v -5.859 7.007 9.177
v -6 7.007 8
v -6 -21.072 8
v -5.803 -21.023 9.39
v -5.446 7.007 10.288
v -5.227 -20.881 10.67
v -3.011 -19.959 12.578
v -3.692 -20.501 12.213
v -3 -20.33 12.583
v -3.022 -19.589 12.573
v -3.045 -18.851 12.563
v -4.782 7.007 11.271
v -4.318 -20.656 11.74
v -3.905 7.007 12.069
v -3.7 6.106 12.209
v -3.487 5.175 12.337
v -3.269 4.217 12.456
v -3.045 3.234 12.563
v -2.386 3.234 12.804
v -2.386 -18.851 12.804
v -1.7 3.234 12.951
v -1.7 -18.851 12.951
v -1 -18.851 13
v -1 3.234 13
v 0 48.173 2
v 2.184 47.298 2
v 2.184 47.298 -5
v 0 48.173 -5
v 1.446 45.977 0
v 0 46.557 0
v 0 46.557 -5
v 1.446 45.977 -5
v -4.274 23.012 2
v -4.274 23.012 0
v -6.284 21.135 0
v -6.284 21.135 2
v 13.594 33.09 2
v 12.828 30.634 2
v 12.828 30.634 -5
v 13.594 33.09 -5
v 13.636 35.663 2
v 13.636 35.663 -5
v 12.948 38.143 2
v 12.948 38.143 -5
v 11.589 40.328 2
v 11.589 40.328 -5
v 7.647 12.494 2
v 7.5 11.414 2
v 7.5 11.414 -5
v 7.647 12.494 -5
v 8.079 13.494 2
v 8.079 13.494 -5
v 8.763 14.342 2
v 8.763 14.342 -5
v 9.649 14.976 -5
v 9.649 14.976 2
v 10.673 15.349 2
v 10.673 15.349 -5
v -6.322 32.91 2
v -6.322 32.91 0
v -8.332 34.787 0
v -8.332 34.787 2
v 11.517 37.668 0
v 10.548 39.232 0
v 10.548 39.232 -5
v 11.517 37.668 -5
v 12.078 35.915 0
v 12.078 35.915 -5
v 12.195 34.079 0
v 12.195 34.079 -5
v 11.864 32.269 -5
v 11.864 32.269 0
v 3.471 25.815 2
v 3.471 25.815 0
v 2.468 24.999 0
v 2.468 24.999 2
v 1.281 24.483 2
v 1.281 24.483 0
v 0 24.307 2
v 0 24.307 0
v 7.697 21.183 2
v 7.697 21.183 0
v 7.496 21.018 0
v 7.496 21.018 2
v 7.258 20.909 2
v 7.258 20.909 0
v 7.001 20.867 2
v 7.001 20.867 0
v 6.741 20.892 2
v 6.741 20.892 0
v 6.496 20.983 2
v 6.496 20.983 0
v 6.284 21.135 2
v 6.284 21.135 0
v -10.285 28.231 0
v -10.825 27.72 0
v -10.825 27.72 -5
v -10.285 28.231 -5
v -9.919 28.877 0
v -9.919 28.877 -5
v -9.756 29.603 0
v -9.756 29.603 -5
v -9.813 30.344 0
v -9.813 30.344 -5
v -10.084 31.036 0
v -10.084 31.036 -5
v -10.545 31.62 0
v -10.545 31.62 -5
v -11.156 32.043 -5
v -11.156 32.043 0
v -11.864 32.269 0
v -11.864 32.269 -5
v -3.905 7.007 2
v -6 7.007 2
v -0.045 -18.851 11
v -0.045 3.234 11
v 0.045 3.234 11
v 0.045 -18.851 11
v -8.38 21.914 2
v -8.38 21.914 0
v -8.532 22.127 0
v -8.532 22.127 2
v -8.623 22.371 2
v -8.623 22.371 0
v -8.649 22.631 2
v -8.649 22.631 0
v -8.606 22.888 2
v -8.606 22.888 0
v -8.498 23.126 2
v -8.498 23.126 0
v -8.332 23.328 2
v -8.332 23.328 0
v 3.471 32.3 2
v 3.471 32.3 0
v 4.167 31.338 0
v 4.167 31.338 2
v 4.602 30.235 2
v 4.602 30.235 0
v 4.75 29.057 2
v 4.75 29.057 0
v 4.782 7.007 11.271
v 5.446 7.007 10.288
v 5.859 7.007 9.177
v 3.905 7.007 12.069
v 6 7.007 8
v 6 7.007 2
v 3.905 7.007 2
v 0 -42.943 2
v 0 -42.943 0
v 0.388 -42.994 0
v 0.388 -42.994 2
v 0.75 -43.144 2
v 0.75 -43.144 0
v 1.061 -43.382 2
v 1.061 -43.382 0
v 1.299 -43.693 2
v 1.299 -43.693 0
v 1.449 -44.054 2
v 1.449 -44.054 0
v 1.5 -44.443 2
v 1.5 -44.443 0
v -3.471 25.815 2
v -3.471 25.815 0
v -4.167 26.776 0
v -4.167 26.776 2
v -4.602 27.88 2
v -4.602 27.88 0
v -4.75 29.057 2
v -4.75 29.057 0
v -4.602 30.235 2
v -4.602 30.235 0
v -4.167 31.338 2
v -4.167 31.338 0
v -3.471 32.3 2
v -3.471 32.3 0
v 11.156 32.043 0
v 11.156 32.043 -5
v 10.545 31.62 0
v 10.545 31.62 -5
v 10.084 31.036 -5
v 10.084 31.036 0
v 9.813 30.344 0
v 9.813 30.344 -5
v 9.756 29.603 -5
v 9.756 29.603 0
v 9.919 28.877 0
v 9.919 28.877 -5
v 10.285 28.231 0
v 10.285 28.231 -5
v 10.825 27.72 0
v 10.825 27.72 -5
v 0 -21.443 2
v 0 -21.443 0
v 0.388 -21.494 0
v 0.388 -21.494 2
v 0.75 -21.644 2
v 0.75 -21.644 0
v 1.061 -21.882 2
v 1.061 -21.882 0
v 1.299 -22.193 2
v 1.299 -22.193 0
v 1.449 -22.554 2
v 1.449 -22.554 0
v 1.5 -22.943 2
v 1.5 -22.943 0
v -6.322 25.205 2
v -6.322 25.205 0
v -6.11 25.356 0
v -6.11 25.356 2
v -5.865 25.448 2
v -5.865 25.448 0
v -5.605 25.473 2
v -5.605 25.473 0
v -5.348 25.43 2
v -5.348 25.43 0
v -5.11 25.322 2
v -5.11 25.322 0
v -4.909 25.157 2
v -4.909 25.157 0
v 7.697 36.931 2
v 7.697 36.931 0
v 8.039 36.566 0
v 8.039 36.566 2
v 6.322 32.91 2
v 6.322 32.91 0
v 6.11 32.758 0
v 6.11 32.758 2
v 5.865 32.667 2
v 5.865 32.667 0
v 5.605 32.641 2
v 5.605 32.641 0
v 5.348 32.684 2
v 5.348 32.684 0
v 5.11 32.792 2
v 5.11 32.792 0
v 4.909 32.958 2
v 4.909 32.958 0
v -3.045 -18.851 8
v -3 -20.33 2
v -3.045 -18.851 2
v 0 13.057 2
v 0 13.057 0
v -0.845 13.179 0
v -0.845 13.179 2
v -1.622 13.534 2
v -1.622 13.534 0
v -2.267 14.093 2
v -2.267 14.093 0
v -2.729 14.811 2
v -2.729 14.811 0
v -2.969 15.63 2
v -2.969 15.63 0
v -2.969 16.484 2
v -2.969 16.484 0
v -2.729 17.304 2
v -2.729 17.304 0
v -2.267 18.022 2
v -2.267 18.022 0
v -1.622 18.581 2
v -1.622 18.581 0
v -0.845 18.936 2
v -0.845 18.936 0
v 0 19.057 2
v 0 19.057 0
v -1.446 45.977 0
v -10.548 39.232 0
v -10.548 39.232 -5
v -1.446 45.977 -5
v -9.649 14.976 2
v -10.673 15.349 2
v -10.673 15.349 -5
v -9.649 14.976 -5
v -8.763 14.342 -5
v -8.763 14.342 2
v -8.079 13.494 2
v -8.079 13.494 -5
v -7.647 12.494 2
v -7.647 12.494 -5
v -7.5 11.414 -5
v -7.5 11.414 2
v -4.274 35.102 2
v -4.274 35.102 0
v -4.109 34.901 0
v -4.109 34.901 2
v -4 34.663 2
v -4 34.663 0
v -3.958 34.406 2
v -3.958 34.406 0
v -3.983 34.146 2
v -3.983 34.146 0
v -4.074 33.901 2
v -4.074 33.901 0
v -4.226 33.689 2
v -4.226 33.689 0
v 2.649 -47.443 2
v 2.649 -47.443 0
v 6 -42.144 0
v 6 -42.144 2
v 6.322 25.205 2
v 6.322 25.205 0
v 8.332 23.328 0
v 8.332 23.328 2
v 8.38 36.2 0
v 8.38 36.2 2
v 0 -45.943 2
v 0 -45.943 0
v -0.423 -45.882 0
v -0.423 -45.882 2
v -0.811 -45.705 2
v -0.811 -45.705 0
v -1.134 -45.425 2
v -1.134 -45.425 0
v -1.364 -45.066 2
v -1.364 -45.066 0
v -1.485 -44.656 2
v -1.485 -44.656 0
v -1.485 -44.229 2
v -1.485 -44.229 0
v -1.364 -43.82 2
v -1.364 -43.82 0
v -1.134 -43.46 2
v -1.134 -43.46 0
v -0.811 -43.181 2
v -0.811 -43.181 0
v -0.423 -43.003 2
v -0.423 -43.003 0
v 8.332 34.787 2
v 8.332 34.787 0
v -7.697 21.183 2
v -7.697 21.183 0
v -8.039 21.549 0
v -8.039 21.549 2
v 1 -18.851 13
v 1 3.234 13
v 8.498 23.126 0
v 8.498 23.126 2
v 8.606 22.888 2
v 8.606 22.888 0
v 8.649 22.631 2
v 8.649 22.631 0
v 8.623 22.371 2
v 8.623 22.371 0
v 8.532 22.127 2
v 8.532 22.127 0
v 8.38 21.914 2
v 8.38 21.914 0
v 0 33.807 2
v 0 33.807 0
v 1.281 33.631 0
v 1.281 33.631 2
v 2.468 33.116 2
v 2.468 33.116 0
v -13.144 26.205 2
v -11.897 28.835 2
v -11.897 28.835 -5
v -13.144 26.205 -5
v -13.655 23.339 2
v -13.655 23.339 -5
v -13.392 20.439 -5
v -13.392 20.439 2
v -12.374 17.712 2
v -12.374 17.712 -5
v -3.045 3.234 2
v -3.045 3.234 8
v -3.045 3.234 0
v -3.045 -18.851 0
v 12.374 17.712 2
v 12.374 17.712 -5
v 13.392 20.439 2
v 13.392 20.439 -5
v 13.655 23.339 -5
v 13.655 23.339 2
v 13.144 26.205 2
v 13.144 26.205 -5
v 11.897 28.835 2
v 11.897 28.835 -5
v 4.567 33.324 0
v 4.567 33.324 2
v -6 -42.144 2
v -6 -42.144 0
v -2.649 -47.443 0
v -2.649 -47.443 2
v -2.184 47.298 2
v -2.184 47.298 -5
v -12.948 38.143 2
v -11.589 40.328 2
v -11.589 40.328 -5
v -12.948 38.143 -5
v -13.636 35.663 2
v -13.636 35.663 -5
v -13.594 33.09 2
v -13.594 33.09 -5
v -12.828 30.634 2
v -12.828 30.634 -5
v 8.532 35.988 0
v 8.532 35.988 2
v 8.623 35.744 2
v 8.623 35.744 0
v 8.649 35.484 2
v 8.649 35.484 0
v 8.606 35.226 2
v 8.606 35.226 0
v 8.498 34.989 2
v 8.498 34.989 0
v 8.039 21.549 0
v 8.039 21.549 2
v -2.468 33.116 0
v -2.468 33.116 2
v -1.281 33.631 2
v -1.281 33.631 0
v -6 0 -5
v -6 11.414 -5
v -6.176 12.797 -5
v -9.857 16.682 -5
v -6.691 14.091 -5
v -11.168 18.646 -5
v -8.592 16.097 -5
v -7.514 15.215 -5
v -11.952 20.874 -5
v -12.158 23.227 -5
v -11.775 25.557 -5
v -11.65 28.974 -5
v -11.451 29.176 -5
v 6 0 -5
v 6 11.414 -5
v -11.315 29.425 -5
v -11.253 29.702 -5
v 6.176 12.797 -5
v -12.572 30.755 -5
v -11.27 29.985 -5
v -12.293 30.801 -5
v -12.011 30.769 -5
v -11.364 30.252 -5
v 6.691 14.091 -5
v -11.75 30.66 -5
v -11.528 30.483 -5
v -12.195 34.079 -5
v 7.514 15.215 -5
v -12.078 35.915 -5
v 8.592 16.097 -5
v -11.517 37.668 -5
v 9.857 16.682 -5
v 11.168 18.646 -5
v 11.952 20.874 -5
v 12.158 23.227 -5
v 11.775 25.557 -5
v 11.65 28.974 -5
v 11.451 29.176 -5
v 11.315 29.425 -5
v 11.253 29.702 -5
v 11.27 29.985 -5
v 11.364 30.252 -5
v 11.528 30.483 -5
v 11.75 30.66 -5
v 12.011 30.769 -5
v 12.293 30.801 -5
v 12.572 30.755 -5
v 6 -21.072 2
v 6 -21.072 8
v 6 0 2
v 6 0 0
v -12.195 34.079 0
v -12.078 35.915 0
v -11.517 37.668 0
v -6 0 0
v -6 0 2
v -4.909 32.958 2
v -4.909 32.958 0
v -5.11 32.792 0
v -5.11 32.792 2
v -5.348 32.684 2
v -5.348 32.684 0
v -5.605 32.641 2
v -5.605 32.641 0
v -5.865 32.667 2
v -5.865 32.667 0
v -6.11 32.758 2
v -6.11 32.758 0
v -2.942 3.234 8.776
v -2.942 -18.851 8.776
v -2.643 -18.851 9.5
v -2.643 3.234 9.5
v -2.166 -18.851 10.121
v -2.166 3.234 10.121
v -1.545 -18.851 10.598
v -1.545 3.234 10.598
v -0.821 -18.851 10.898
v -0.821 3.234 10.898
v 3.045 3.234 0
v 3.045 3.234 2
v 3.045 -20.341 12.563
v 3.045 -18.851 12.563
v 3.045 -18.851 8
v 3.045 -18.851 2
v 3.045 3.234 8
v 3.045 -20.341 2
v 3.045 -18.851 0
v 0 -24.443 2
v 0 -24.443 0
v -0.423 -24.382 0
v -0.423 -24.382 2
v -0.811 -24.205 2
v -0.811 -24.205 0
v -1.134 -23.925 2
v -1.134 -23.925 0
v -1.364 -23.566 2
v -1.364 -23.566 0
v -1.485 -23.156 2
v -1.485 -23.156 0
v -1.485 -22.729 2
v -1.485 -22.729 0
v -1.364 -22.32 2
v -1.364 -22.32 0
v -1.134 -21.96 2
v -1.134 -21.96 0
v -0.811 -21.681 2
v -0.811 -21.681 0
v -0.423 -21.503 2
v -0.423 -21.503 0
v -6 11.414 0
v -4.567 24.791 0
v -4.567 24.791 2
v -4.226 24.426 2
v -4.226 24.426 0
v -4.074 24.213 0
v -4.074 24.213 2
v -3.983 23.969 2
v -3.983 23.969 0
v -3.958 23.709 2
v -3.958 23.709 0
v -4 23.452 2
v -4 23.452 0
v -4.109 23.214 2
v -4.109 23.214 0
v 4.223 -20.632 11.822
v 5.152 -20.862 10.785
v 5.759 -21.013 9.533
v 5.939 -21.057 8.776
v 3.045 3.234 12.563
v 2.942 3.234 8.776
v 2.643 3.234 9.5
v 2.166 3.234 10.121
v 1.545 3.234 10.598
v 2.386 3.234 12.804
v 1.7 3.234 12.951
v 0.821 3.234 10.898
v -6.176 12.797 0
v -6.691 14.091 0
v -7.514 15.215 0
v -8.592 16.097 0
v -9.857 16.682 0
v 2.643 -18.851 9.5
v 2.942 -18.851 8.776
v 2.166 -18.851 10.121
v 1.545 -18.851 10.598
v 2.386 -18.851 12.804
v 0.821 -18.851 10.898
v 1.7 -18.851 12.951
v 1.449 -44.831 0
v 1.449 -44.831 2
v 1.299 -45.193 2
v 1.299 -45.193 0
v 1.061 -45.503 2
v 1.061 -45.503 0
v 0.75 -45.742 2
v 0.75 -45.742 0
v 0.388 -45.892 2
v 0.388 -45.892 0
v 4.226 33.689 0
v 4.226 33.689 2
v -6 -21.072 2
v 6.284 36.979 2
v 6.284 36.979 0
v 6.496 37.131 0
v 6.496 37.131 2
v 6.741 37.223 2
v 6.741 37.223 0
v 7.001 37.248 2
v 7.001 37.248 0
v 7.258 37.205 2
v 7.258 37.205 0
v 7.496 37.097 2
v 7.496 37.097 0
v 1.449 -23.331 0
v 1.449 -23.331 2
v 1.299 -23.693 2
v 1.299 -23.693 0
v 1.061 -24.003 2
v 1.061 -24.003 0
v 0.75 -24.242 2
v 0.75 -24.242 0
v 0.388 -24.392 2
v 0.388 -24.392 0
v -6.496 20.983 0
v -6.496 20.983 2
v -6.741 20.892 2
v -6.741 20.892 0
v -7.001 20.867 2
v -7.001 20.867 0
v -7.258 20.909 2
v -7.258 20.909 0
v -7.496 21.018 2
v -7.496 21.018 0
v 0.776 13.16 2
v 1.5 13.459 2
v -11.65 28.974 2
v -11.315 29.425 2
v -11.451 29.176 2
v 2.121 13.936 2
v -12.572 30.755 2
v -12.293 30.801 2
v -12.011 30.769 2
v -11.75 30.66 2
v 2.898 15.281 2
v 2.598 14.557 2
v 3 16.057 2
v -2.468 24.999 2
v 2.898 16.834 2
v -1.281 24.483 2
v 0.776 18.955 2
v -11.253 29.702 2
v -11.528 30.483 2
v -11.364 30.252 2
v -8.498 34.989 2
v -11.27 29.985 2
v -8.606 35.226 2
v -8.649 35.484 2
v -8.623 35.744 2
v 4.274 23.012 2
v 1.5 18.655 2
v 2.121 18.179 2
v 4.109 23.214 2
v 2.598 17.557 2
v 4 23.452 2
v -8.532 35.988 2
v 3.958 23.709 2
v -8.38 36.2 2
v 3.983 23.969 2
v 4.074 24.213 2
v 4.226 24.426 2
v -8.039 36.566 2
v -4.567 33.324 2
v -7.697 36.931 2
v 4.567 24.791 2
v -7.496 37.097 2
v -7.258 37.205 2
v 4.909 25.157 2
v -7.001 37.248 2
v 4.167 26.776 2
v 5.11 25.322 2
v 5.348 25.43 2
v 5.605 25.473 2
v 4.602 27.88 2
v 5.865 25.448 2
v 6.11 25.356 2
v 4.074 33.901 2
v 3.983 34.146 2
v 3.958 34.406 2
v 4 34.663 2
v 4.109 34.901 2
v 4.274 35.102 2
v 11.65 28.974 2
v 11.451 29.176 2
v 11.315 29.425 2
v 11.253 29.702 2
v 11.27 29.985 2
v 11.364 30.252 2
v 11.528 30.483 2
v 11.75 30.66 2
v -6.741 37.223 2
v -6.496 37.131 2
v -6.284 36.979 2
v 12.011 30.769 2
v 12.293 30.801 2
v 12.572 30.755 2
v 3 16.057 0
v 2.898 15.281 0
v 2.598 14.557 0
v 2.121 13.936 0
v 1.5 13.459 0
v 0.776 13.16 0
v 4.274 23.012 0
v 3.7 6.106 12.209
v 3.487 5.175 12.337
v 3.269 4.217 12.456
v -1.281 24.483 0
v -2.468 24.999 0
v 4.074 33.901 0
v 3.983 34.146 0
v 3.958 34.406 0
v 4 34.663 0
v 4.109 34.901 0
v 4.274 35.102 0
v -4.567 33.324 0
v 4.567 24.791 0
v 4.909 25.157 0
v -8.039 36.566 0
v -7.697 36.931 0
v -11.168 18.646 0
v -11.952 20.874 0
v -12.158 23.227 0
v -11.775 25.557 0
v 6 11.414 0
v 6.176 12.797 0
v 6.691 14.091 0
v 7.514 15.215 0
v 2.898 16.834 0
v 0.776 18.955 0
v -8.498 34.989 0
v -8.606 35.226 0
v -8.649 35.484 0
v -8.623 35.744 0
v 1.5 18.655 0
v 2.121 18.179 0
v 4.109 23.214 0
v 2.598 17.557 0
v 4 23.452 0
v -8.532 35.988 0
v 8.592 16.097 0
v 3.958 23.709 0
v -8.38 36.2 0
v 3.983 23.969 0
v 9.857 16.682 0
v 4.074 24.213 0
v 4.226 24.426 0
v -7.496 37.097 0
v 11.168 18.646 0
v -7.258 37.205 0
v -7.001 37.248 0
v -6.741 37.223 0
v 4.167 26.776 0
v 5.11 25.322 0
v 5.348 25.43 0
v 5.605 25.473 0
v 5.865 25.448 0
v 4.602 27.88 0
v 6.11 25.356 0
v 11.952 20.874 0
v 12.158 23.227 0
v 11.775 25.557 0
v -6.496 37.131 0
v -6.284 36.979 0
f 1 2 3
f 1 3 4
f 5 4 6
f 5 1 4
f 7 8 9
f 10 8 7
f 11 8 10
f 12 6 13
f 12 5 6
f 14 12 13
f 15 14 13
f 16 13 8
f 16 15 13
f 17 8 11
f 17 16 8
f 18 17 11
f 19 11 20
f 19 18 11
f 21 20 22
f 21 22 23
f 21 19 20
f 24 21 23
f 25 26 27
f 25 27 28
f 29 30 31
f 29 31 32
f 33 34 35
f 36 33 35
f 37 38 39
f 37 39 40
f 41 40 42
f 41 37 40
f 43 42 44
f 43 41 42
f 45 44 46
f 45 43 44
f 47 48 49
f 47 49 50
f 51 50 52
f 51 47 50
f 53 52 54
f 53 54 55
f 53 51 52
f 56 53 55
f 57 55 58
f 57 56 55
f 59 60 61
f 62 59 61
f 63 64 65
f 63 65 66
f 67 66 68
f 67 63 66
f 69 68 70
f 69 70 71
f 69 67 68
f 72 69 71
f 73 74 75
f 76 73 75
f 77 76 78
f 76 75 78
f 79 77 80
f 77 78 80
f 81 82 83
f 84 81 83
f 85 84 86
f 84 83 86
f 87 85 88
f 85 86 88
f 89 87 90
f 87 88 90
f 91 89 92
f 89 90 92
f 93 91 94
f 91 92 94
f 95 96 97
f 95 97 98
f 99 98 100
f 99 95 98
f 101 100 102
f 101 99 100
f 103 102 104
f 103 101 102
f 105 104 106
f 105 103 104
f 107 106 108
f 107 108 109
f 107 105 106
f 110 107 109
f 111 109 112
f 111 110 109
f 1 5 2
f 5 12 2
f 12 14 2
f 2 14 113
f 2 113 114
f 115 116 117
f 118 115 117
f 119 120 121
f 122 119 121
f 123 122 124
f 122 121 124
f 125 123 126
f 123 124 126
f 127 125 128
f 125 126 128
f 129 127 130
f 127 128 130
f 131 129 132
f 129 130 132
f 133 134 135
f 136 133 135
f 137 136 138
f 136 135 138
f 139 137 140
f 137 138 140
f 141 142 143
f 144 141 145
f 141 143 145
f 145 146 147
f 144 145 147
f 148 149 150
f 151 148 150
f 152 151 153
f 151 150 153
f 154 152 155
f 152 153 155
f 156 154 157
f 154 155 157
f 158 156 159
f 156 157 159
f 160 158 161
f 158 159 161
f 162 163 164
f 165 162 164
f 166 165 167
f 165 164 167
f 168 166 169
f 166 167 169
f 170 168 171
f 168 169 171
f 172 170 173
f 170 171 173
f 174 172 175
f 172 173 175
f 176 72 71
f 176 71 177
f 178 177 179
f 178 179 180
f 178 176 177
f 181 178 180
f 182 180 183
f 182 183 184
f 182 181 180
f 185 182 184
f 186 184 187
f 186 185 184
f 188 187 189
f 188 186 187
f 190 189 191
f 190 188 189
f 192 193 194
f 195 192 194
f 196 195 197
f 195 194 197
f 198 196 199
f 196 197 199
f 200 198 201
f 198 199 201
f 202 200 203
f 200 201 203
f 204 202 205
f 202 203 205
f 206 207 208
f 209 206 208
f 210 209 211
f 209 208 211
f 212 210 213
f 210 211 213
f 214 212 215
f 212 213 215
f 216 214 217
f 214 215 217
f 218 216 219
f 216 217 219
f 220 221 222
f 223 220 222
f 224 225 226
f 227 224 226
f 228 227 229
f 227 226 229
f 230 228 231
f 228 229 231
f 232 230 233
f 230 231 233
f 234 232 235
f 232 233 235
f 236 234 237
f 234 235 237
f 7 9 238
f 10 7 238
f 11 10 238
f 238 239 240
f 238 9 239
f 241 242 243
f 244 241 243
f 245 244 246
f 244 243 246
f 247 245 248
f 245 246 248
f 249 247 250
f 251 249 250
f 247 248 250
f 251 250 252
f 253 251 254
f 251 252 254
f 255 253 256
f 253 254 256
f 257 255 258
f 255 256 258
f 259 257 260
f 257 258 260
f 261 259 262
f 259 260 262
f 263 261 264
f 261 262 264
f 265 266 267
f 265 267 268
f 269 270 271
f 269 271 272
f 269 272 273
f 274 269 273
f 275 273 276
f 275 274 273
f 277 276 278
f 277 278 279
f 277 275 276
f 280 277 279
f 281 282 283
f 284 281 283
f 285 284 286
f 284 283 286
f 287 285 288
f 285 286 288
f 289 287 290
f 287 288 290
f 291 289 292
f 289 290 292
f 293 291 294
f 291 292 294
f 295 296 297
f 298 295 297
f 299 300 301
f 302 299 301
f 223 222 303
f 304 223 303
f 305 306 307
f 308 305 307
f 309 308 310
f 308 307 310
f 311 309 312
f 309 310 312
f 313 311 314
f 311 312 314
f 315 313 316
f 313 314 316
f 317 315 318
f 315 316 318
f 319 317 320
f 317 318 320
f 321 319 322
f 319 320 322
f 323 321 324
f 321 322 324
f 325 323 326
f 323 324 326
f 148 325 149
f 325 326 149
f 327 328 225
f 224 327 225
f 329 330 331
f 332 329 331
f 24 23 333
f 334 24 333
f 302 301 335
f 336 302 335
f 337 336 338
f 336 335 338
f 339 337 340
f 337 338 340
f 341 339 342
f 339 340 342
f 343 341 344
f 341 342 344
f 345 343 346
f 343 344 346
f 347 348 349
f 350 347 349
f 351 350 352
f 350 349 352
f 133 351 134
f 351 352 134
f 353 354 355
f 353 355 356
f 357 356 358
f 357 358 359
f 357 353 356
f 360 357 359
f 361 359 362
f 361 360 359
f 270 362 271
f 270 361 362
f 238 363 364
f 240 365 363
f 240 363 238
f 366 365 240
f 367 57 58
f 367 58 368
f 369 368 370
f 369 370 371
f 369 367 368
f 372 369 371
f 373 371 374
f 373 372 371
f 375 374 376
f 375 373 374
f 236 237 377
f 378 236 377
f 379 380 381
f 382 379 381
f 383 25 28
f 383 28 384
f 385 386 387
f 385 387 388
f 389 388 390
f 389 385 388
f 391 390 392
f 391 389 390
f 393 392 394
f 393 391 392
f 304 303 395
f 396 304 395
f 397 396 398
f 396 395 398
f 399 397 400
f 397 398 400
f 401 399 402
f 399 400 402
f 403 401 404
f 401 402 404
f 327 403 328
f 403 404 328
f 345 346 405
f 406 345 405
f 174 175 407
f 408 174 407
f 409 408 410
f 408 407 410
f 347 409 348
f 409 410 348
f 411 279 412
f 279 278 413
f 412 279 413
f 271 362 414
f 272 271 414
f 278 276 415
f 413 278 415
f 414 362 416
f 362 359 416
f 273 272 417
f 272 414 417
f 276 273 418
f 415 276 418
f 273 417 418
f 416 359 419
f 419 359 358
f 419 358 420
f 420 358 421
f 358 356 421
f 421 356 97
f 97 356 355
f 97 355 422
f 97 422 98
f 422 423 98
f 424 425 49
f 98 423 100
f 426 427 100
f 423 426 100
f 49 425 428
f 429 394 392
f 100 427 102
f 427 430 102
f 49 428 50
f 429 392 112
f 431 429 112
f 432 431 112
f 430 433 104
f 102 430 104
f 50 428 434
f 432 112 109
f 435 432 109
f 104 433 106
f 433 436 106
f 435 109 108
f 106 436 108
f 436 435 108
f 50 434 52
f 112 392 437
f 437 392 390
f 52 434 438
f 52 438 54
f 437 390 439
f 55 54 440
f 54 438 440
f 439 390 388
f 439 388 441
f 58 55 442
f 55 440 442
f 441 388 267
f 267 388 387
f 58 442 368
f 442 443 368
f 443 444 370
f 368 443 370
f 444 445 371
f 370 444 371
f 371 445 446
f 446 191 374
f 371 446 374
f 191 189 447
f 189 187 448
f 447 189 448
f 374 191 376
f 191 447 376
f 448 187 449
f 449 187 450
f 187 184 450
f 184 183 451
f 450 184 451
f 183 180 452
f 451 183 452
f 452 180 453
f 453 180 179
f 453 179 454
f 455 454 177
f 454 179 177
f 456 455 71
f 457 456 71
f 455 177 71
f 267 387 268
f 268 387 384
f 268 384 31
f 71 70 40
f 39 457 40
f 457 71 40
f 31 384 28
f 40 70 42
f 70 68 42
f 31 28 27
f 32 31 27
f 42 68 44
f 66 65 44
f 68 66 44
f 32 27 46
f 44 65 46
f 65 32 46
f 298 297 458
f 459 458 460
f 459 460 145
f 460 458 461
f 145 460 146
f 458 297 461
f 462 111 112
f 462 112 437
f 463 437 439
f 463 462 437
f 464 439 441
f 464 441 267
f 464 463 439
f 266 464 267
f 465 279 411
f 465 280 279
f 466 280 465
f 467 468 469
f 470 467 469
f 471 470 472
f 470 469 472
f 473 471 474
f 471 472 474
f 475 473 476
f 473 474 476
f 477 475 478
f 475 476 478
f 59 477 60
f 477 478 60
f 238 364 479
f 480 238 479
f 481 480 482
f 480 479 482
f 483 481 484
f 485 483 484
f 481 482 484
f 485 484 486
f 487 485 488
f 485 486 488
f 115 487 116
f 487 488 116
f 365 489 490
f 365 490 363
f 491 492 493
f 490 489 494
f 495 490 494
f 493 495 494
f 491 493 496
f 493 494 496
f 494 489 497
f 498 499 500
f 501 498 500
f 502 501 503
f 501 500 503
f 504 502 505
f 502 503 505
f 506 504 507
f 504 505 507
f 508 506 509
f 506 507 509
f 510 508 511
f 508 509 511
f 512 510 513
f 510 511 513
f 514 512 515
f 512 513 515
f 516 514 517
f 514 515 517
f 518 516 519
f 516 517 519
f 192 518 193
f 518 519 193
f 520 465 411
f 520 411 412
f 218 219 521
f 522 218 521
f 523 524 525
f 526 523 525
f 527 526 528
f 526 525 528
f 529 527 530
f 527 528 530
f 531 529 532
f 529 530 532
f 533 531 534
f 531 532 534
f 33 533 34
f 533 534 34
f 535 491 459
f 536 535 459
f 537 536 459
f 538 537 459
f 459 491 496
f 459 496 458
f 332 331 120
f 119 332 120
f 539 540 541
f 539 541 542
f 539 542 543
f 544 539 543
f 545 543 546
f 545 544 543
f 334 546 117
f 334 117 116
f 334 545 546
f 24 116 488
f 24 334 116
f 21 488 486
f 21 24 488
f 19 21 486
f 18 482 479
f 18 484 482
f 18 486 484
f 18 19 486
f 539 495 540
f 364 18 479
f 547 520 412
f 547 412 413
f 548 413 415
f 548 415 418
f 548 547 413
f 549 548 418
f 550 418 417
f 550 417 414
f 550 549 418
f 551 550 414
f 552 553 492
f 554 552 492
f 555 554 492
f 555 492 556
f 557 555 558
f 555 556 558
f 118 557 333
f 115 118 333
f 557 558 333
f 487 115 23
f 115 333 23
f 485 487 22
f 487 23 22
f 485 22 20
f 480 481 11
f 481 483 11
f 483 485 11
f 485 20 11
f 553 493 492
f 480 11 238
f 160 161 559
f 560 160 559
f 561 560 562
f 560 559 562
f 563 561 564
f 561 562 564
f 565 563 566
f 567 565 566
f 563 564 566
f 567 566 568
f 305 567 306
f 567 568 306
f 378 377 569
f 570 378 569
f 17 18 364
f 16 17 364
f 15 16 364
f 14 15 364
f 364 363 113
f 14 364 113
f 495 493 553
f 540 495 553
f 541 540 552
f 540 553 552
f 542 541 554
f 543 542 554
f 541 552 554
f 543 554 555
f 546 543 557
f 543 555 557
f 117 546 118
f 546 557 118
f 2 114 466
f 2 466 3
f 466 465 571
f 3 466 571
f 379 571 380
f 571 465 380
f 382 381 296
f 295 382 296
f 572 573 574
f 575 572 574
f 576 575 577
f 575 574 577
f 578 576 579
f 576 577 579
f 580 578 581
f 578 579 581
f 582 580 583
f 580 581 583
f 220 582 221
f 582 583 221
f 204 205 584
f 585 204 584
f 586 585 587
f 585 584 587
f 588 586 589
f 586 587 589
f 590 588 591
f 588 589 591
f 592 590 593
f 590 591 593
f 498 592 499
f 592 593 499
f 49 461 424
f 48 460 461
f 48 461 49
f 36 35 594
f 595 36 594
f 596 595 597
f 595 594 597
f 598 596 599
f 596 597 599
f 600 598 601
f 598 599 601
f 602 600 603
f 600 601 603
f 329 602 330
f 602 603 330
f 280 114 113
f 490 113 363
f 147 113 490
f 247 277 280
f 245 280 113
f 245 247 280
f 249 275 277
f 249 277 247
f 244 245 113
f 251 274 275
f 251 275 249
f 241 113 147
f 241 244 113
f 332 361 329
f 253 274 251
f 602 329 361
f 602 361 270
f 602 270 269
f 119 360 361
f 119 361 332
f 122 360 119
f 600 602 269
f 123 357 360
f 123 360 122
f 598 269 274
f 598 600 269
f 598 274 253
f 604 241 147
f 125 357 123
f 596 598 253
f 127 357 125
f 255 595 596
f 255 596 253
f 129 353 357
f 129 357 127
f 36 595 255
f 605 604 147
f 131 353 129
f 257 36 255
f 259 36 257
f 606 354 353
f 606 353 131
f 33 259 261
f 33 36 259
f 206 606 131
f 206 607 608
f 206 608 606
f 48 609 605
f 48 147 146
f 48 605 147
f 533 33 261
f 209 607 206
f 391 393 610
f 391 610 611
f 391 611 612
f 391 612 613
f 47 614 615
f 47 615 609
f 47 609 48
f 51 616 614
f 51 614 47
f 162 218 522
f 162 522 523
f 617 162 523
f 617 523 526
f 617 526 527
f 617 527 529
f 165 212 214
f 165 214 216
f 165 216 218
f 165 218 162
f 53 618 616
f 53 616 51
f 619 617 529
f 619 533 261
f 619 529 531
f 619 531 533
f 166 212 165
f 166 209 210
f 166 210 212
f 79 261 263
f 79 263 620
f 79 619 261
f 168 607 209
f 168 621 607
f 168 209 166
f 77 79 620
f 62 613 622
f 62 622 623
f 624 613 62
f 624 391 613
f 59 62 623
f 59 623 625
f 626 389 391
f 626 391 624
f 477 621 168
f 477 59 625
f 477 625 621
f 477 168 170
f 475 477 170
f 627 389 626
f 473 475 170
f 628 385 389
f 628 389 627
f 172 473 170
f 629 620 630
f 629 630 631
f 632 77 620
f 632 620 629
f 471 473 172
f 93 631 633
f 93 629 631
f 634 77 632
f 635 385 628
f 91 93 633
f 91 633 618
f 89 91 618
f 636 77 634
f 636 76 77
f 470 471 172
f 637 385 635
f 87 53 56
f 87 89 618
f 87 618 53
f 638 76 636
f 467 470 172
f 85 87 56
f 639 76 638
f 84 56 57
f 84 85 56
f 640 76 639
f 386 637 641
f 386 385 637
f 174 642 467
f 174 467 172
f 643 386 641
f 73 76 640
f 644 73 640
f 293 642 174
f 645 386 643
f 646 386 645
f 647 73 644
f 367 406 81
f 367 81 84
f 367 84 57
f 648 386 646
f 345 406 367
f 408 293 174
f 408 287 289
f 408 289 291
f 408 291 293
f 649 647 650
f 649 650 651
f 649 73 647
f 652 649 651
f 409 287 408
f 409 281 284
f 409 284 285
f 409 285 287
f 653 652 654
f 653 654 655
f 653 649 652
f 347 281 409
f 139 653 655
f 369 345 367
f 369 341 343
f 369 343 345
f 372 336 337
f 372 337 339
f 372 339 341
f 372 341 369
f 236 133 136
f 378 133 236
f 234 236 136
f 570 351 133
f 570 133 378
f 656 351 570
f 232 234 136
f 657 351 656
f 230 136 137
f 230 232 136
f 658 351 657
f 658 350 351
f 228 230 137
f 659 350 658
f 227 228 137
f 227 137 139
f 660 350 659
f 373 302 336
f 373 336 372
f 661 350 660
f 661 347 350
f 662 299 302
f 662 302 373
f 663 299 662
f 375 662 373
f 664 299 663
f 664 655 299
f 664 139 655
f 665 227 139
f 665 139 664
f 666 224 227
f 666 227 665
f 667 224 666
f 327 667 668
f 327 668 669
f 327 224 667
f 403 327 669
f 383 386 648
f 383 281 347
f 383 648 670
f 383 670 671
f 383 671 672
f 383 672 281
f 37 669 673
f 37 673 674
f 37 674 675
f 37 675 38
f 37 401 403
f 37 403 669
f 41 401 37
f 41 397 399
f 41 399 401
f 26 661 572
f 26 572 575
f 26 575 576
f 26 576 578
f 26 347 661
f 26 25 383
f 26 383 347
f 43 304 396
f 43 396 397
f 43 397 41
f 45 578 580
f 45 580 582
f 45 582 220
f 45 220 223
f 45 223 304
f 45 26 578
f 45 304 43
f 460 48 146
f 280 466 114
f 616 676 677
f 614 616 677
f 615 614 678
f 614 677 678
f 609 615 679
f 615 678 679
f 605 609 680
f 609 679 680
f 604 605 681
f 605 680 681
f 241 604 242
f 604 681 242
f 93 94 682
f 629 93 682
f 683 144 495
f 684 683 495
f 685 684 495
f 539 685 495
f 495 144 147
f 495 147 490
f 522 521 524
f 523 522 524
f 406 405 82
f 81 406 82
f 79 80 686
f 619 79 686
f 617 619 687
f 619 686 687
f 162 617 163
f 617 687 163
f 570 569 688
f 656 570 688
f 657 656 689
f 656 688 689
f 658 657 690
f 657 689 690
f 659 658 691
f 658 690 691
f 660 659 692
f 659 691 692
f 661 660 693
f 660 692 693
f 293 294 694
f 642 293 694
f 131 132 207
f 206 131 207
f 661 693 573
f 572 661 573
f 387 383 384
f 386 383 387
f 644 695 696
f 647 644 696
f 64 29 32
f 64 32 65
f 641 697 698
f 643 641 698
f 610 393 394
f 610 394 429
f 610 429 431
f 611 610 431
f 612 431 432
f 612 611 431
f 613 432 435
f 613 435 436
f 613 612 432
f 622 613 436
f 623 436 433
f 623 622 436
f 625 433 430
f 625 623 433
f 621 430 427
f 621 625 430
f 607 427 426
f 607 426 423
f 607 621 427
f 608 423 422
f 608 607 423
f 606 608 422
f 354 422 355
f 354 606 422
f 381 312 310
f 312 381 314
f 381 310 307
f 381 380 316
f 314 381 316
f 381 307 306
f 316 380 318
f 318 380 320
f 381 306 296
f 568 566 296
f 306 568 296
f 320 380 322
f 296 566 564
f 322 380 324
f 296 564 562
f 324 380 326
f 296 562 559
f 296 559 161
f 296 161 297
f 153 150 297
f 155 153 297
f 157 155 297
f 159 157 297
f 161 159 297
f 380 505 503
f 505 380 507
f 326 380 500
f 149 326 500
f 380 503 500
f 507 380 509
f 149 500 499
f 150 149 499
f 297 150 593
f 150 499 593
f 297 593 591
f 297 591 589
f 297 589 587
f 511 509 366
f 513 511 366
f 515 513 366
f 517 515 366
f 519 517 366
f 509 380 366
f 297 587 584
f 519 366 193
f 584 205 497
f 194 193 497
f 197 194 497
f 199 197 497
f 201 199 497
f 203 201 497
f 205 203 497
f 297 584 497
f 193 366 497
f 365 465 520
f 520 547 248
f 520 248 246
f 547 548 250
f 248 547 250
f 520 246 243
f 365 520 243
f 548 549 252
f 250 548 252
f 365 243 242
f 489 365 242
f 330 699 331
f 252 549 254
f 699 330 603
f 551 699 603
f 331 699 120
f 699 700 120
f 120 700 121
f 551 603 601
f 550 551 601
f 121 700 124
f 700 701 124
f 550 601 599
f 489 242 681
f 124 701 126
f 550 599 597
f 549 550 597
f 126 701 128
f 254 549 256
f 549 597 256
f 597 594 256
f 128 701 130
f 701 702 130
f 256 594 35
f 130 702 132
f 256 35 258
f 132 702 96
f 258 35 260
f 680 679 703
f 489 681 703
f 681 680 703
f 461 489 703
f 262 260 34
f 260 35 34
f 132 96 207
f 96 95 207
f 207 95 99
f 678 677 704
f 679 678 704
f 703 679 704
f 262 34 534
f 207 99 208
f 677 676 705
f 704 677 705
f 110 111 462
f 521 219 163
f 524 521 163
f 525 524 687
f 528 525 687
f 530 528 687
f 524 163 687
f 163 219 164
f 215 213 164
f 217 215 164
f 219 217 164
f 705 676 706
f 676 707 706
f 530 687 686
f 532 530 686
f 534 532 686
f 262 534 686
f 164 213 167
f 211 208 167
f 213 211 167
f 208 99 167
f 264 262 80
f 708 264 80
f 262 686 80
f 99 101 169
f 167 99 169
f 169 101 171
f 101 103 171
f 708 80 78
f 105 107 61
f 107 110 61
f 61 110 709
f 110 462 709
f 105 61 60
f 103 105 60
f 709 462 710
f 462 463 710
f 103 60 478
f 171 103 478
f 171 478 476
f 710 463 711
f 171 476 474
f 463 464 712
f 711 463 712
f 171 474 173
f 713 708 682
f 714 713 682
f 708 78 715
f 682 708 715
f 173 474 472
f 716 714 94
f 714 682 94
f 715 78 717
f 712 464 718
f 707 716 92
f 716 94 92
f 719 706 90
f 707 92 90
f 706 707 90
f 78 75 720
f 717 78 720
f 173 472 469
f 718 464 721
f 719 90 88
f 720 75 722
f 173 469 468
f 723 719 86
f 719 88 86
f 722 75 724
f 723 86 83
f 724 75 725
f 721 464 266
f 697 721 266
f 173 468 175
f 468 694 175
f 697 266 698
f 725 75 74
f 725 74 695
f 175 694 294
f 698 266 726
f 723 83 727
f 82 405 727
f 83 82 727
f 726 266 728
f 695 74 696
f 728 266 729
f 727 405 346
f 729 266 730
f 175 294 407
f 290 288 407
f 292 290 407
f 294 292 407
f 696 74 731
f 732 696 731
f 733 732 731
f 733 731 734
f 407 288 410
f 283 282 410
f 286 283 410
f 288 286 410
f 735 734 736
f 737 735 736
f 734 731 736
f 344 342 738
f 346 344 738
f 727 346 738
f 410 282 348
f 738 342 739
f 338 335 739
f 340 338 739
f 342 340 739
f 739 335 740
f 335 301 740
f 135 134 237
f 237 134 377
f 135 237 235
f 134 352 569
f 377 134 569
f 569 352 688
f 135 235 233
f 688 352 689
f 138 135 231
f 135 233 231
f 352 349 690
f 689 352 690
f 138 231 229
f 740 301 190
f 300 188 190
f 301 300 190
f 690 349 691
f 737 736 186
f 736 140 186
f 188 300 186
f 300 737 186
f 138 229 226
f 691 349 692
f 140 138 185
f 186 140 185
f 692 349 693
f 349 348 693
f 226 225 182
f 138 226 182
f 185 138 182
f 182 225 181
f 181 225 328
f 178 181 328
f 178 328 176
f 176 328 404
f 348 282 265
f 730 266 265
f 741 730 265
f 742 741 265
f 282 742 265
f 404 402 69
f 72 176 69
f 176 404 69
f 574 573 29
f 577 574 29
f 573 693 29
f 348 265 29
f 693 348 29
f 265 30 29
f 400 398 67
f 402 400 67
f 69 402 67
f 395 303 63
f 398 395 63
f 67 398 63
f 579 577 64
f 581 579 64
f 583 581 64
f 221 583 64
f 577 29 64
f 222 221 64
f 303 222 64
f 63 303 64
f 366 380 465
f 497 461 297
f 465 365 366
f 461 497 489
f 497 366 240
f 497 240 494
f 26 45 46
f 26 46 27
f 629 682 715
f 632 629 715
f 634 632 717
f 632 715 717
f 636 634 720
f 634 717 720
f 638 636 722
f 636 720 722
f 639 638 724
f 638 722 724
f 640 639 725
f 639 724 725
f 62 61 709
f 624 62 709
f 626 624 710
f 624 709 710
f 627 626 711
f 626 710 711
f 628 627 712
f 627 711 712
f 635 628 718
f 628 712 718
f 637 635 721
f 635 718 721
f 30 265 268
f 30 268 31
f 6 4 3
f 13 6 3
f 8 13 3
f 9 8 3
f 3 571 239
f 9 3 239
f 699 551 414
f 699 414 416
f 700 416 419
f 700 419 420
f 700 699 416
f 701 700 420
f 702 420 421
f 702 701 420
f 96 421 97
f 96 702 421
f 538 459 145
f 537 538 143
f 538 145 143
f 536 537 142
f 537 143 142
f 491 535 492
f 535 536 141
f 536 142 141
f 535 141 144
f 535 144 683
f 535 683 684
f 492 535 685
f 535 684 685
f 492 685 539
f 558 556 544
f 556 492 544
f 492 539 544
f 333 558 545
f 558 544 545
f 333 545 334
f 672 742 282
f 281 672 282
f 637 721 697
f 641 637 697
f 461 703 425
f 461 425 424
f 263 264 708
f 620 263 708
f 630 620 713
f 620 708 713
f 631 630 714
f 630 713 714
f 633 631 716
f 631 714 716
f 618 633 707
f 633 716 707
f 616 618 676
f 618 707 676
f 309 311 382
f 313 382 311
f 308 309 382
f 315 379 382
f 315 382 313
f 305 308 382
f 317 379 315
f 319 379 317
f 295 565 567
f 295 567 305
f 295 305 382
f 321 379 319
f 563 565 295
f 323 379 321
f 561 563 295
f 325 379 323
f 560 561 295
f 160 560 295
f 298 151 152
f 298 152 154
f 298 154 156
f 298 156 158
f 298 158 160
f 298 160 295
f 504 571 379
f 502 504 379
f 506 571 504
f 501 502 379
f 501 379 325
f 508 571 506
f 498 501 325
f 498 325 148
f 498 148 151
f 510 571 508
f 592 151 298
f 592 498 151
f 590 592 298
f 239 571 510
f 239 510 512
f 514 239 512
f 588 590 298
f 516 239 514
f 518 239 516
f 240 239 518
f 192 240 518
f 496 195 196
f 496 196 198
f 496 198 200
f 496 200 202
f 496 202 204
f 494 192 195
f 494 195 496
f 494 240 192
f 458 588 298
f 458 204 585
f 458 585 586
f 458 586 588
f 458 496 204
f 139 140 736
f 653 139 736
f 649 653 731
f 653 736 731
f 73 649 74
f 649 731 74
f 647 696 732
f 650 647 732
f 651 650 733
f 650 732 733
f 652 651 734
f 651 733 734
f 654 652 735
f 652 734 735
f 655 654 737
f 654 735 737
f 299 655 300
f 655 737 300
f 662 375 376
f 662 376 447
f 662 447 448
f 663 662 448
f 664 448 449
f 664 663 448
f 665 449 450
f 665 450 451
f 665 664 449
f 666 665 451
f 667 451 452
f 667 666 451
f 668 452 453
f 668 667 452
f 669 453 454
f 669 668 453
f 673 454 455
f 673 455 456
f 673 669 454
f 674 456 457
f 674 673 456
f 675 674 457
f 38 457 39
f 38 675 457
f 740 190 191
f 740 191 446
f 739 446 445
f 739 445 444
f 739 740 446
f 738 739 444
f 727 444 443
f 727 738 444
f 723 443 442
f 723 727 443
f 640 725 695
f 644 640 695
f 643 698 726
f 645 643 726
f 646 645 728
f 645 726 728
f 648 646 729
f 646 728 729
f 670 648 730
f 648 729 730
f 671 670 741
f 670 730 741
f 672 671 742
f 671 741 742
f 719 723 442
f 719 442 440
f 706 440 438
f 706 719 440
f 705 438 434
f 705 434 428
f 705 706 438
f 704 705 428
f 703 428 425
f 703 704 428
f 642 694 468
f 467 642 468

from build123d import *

# Parameters (mm, degrees)
F1_DEPTH     = 2
F0_W         = 3.0445663724
F0_H         = 3.2343552448
F0_H_2       = 18.850909546
F2_DEPTH     = 13
F3_DEPTH     = 11
F4_T4_DEPTH  = 22.0852647908
F4_T9_DEPTH  = 22.0852647908
F4_T15_DEPTH = 22.0852647908
F4_T20_DEPTH = 22.0852647908
F5_DEPTH     = 5
F6_T1_DEPTH  = 53.0795018189


# Not quite as in the source:
# - a fillet or chamfer that OpenCascade refuses, or shapes differently, is made with other operations: its cross-section is extruded or revolved along the edge and cut away or added


with BuildPart() as f1:
    # F0 (on Top) → F1 (new body)
    with BuildSketch(Plane.XY):
        with BuildLine():
            Line((0, -21.442663461), (0, -19.587084651))
            Line((0, -19.587084651), (-3, -20.329666324))
            Line((-3, -20.329666324), (-6, -21.0722479969))
            Line((-6, -21.0722479969), (-6, -42.1444959939))
            Line((-6, -42.1444959939), (-2.6490809396, -47.442663461))
            Line((-2.6490809396, -47.442663461), (0, -47.442663461))
            Line((0, -47.442663461), (0, -45.942663461))
            ThreePointArc((0, -45.942663461), (-1.5, -44.442663461), (0, -42.942663461))
            Line((0, -42.942663461), (0, -24.442663461))
            ThreePointArc((0, -24.442663461), (-1.5, -22.942663461), (0, -21.442663461))
        make_face()
        with BuildLine():
            Line((3.0445663724, -20.3406977144), (0, -19.587084651))
            Line((0, -19.587084651), (0, -21.442663461))
            ThreePointArc((0, -21.442663461), (1.0606601718, -21.8820032892), (1.5, -22.942663461))
            ThreePointArc((1.5, -22.942663461), (1.0606601718, -24.0033236327), (0, -24.442663461))
            Line((0, -24.442663461), (0, -42.942663461))
            ThreePointArc((0, -42.942663461), (1.0606601718, -43.3820032892), (1.5, -44.442663461))
            ThreePointArc((1.5, -44.442663461), (1.0606601718, -45.5033236327), (0, -45.942663461))
            Line((0, -45.942663461), (0, -47.442663461))
            Line((0, -47.442663461), (2.6490809396, -47.442663461))
            Line((2.6490809396, -47.442663461), (6, -42.1444959939))
            Line((6, -42.1444959939), (6, -21.0722479969))
            Line((6, -21.0722479969), (3.0445663724, -20.3406977144))
        make_face()
        Polygon((3.0445663724, -18.850909546), (0, -18.850909546), (0, -19.587084651), (3.0445663724, -20.3406977144), align=None)
        Polygon((0, -19.587084651), (0, -18.850909546), (-3.0445663724, -18.850909546), (-3, -20.329666324), align=None)
    extrude(amount=F1_DEPTH)



with BuildPart() as f1b:
    # F0 (on Top) → F1, piece 2 (new body)
    with BuildSketch(Plane.XY):
        with BuildLine():
            Line((-6, 7.0072538219), (-6, 11.414472945))
            ThreePointArc((-6, 11.414472945), (-7.0672827337, 14.6788128793), (-9.8568433896, 16.6821498424))
            ThreePointArc((-9.8568433896, 16.6821498424), (-12.1286787232, 22.0440734554), (-10.825092271, 27.7196459355))
            ThreePointArc((-10.825092271, 27.7196459355), (-9.8130602705, 30.3439953427), (-11.8637687892, 32.269096159))
            ThreePointArc((-11.8637687892, 32.269096159), (-12.0776575065, 35.9154722642), (-10.5480544763, 39.2324168906))
            Line((-10.5480544763, 39.2324168906), (-1.4462802792, 45.9774918854))
            Line((-1.4462802792, 45.9774918854), (0, 46.557336539))
            Line((0, 46.557336539), (1.4462802792, 45.9774918854))
            Line((1.4462802792, 45.9774918854), (10.5480544763, 39.2324168906))
            ThreePointArc((10.5480544763, 39.2324168906), (12.0776575065, 35.9154722642), (11.8637687892, 32.269096159))
            ThreePointArc((11.8637687892, 32.269096159), (9.8130602705, 30.3439953427), (10.825092271, 27.7196459355))
            ThreePointArc((10.825092271, 27.7196459355), (12.1286787232, 22.0440734554), (9.8568433896, 16.6821498424))
            ThreePointArc((9.8568433896, 16.6821498424), (7.0672827337, 14.6788128793), (6, 11.414472945))
            Line((6, 11.414472945), (6, 7.0072538219))
            Line((6, 7.0072538219), (6, 0))
            Line((6, 0), (7.5000002513, 11.414472945))
            ThreePointArc((7.5000002513, 11.414472945), (8.391991284, 13.9415584091), (10.6726818627, 15.3487753182))
            ThreePointArc((10.6726818627, 15.3487753182), (13.6200024271, 21.8800699646), (11.8968068959, 28.8352914154))
            ThreePointArc((11.8968068959, 28.8352914154), (11.3640087027, 30.251868892), (12.8284885302, 30.6337910005))
            ThreePointArc((12.8284885302, 30.6337910005), (13.635549564, 35.6633929404), (11.5888776878, 40.3280877233))
            Line((11.5888776878, 40.3280877233), (2.1839900136, 47.2977917949))
            Line((2.1839900136, 47.2977917949), (0, 48.173400037))
            Line((0, 48.173400037), (-2.1839900136, 47.2977917949))
            Line((-2.1839900136, 47.2977917949), (-11.5888776878, 40.3280877233))
            ThreePointArc((-11.5888776878, 40.3280877233), (-13.635549564, 35.6633929404), (-12.8284885302, 30.6337910005))
            ThreePointArc((-12.8284885302, 30.6337910005), (-11.3640087027, 30.251868892), (-11.8968068959, 28.8352914154))
            ThreePointArc((-11.8968068959, 28.8352914154), (-13.6200024271, 21.8800699646), (-10.6726818627, 15.3487753182))
            ThreePointArc((-10.6726818627, 15.3487753182), (-8.391991284, 13.9415584091), (-7.5000002513, 11.414472945))
            Line((-7.5000002513, 11.414472945), (-6, 0))
            Line((-6, 0), (-6, 7.0072538219))
        make_face()
        with BuildLine():
            Line((-6, 11.414472945), (0, 11.414472945))
            Line((0, 11.414472945), (0, 13.057336539))
            ThreePointArc((0, 13.057336539), (-3, 16.057336539), (0, 19.057336539))
            Line((0, 19.057336539), (0, 24.307336539))
            ThreePointArc((0, 24.307336539), (-1.892281439, 24.7005291121), (-3.4712866642, 25.8150119262))
            ThreePointArc((-3.4712866642, 25.8150119262), (-4.75, 29.057336539), (-3.4712866642, 32.2996611519))
            ThreePointArc((-3.4712866642, 32.2996611519), (-1.892281439, 33.414143966), (0, 33.807336539))
            Line((0, 33.807336539), (0, 46.557336539))
            Line((0, 46.557336539), (-1.4462802792, 45.9774918854))
            Line((-1.4462802792, 45.9774918854), (-10.5480544763, 39.2324168906))
            ThreePointArc((-10.5480544763, 39.2324168906), (-12.0776575065, 35.9154722642), (-11.8637687892, 32.269096159))
            ThreePointArc((-11.8637687892, 32.269096159), (-9.8130602705, 30.3439953427), (-10.825092271, 27.7196459355))
            ThreePointArc((-10.825092271, 27.7196459355), (-12.1286787232, 22.0440734554), (-9.8568433896, 16.6821498424))
            ThreePointArc((-9.8568433896, 16.6821498424), (-7.0672827337, 14.6788128793), (-6, 11.414472945))
        make_face()
        with BuildLine():
            Line((-4.9087797805, 25.1565185394), (-4.5674824529, 24.7911199432))
            Line((-4.5674824529, 24.7911199432), (-4.2261851252, 24.4257213469))
            ThreePointArc((-4.2261851252, 24.4257213469), (-3.9575633576, 23.7090423507), (-4.2743876623, 23.0123294991))
            Line((-4.2743876623, 23.0123294991), (-6.2840799416, 21.135194197))
            ThreePointArc((-6.2840799416, 21.135194197), (-7.0007589378, 20.8665724294), (-7.6974717894, 21.1833967341))
            Line((-7.6974717894, 21.1833967341), (-8.038769117, 21.5487953303))
            Line((-8.038769117, 21.5487953303), (-8.3800664447, 21.9141939265))
            ThreePointArc((-8.3800664447, 21.9141939265), (-8.6486882123, 22.6308729227), (-8.3318639076, 23.3275857743))
            Line((-8.3318639076, 23.3275857743), (-6.3221716283, 25.2047210765))
            ThreePointArc((-6.3221716283, 25.2047210765), (-5.6054926321, 25.4733428441), (-4.9087797805, 25.1565185394))
        make_face(mode=Mode.SUBTRACT)
        with BuildLine():
            Line((-4.2261851252, 33.6889517311), (-4.5674824529, 33.3235531349))
            Line((-4.5674824529, 33.3235531349), (-4.9087797805, 32.9581545387))
            ThreePointArc((-4.9087797805, 32.9581545387), (-5.6054926321, 32.641330234), (-6.3221716283, 32.9099520015))
            Line((-6.3221716283, 32.9099520015), (-8.3318639076, 34.7870873037))
            ThreePointArc((-8.3318639076, 34.7870873037), (-8.6486882123, 35.4838001553), (-8.3800664447, 36.2004791515))
            Line((-8.3800664447, 36.2004791515), (-8.038769117, 36.5658777478))
            Line((-8.038769117, 36.5658777478), (-7.6974717894, 36.931276344))
            ThreePointArc((-7.6974717894, 36.931276344), (-7.0007589378, 37.2481006487), (-6.2840799416, 36.9794788811))
            Line((-6.2840799416, 36.9794788811), (-4.2743876623, 35.1023435789))
            ThreePointArc((-4.2743876623, 35.1023435789), (-3.9575633576, 34.4056307273), (-4.2261851252, 33.6889517311))
        make_face(mode=Mode.SUBTRACT)
        with BuildLine():
            Line((0, 13.057336539), (0, 11.414472945))
            Line((0, 11.414472945), (6, 11.414472945))
            ThreePointArc((6, 11.414472945), (7.0672827337, 14.6788128793), (9.8568433896, 16.6821498424))
            ThreePointArc((9.8568433896, 16.6821498424), (12.1286787232, 22.0440734554), (10.825092271, 27.7196459355))
            ThreePointArc((10.825092271, 27.7196459355), (9.8130602705, 30.3439953427), (11.8637687892, 32.269096159))
            ThreePointArc((11.8637687892, 32.269096159), (12.0776575065, 35.9154722642), (10.5480544763, 39.2324168906))
            Line((10.5480544763, 39.2324168906), (1.4462802792, 45.9774918854))
            Line((1.4462802792, 45.9774918854), (0, 46.557336539))
            Line((0, 46.557336539), (0, 33.807336539))
            ThreePointArc((0, 33.807336539), (1.892281439, 33.414143966), (3.4712866642, 32.2996611519))
            ThreePointArc((3.4712866642, 32.2996611519), (4.4187731134, 30.8000195775), (4.75, 29.057336539))
            ThreePointArc((4.75, 29.057336539), (4.4187731134, 27.3146535006), (3.4712866642, 25.8150119262))
            ThreePointArc((3.4712866642, 25.8150119262), (1.892281439, 24.7005291121), (0, 24.307336539))
            Line((0, 24.307336539), (0, 19.057336539))
            ThreePointArc((0, 19.057336539), (2.1213203436, 18.1786568826), (3, 16.057336539))
            ThreePointArc((3, 16.057336539), (2.1213203436, 13.9360161955), (0, 13.057336539))
        make_face()
        with BuildLine():
            Line((4.2261851252, 24.4257213469), (4.5674824529, 24.7911199432))
            Line((4.5674824529, 24.7911199432), (4.9087797805, 25.1565185394))
            ThreePointArc((4.9087797805, 25.1565185394), (5.6054926321, 25.4733428441), (6.3221716283, 25.2047210765))
            Line((6.3221716283, 25.2047210765), (8.3318639076, 23.3275857743))
            ThreePointArc((8.3318639076, 23.3275857743), (8.6486882123, 22.6308729227), (8.3800664447, 21.9141939265))
            Line((8.3800664447, 21.9141939265), (8.038769117, 21.5487953303))
            Line((8.038769117, 21.5487953303), (7.6974717894, 21.1833967341))
            ThreePointArc((7.6974717894, 21.1833967341), (7.0007589378, 20.8665724294), (6.2840799416, 21.135194197))
            Line((6.2840799416, 21.135194197), (4.2743876623, 23.0123294991))
            ThreePointArc((4.2743876623, 23.0123294991), (3.9575633576, 23.7090423507), (4.2261851252, 24.4257213469))
        make_face(mode=Mode.SUBTRACT)
        with BuildLine():
            Line((4.9087797805, 32.9581545387), (4.5674824529, 33.3235531349))
            Line((4.5674824529, 33.3235531349), (4.2261851252, 33.6889517311))
            ThreePointArc((4.2261851252, 33.6889517311), (3.9575633576, 34.4056307273), (4.2743876623, 35.1023435789))
            Line((4.2743876623, 35.1023435789), (6.2840799416, 36.9794788811))
            ThreePointArc((6.2840799416, 36.9794788811), (7.0007589378, 37.2481006487), (7.6974717894, 36.931276344))
            Line((7.6974717894, 36.931276344), (8.038769117, 36.5658777478))
            Line((8.038769117, 36.5658777478), (8.3800664447, 36.2004791515))
            ThreePointArc((8.3800664447, 36.2004791515), (8.6486882123, 35.4838001553), (8.3318639076, 34.7870873037))
            Line((8.3318639076, 34.7870873037), (6.3221716283, 32.9099520015))
            ThreePointArc((6.3221716283, 32.9099520015), (5.6054926321, 32.641330234), (4.9087797805, 32.9581545387))
        make_face(mode=Mode.SUBTRACT)
        Polygon((0, 11.414472945), (0, 7.0072538219), (3.9053543005, 7.0072538219), (6, 7.0072538219), (6, 11.414472945), align=None)
        Polygon((-3.9053543005, 7.0072538219), (0, 7.0072538219), (0, 11.414472945), (-6, 11.414472945), (-6, 7.0072538219), align=None)
        Polygon((0, 3.2343552448), (0, 7.0072538219), (-3.9053543005, 7.0072538219), (-3.0445663724, 3.2343552448), align=None)
        Polygon((3.9053543005, 7.0072538219), (0, 7.0072538219), (0, 3.2343552448), (3.0445663724, 3.2343552448), align=None)
    extrude(amount=F1_DEPTH)


with BuildPart() as f1_1:
    add(f1.part)

    add(f1b.part)  # F2 merges F1b
    # F0 (on Top) → F2 (join)
    with BuildSketch(Plane.XY):
        with Locations((1.5222831862, 1.6171776224)):
            Rectangle(F0_W, F0_H)
        Polygon((-3.0445663724, 3.2343552448), (-3.9053543005, 7.0072538219), (-6, 7.0072538219), (-6, 0), (-6, -21.0722479969), (-3, -20.329666324), (-3.0445663724, -18.850909546), align=None)
        with Locations((1.5222831862, -9.425454773)):
            Rectangle(F0_W, F0_H_2)
        Polygon((0, 0), (0, 3.2343552448), (-3.0445663724, 3.2343552448), (-3.0445663724, -18.850909546), (0, -18.850909546), align=None)
        Polygon((6, 0), (3.0445663724, 0), (3.0445663724, -18.850909546), (3.0445663724, -20.3406977144), (6, -21.0722479969), align=None)
        Polygon((6, 7.0072538219), (3.9053543005, 7.0072538219), (3.0445663724, 3.2343552448), (3.0445663724, 0), (6, 0), align=None)
    extrude(amount=F2_DEPTH)

    # F0 (on Top) → F3 (cut)
    with BuildSketch(Plane.XY):
        Polygon((0, 0), (0, 3.2343552448), (-3.0445663724, 3.2343552448), (-3.0445663724, -18.850909546), (0, -18.850909546), align=None)
        with Locations((1.5222831862, -9.425454773)):
            Rectangle(F0_W, F0_H_2)
        with Locations((1.5222831862, 1.6171776224)):
            Rectangle(F0_W, F0_H)
    extrude(amount=F3_DEPTH, mode=Mode.SUBTRACT)

    # F4: fillet of radius 3 on 2 edges, made by hand


with BuildPart() as f4_tool2:
    # F4_s3 → F4_t4 (new body)
    with BuildSketch(Plane.XZ.offset(-3.2343552448)):
        with BuildLine():
            ThreePointArc((-3.0445663724, 8), (-2.165886716, 10.1213203436), (-0.0445663724, 11))
            Line((-0.0445663724, 11), (-3.0445663724, 11))
            Line((-3.0445663724, 11), (-3.0445663724, 8))
        make_face()
    extrude(amount=F4_T4_DEPTH)

    split(bisect_by=Plane(origin=(-2.1925209423, -0.5002243025, 0), x_dir=(0, 0, 1), z_dir=(0.9749476162, 0.2224345875, 0)), keep=Keep.TOP)


with BuildPart() as f1_2:
    add(f1_1.part)

    # F4_t1: union F4_tool2
    add(f4_tool2.part)


with BuildPart() as f4_tool7:
    # F4_s8 → F4_t9 (new body)
    with BuildSketch(Plane.XZ.offset(-3.2343552448)):
        with BuildLine():
            ThreePointArc((-3.0445663724, 8), (-2.165886716, 10.1213203436), (-0.0445663724, 11))
            Line((-0.0445663724, 11), (-3.0445663724, 11))
            Line((-3.0445663724, 11), (-3.0445663724, 8))
        make_face()
    extrude(amount=F4_T9_DEPTH)

    split(bisect_by=Plane(origin=(-2.1925209423, -0.5002243025, 0), x_dir=(0, 0, 1), z_dir=(-0.9749476162, -0.2224345875, 0)), keep=Keep.TOP)

    split(bisect_by=Plane(origin=(-3.6094116269, -0.1087794728, 0), x_dir=(0, 0, 1), z_dir=(0.9995461677, 0.0301240525, 0)), keep=Keep.TOP)


with BuildPart() as f1_3:
    add(f1_2.part)

    # F4_t6: union F4_tool7
    add(f4_tool7.part)


with BuildPart() as f4_tool13:
    # F4_s14 → F4_t15 (new body)
    with BuildSketch(Plane.XZ.offset(18.850909546)):
        with BuildLine():
            ThreePointArc((3.0445663724, 8), (2.165886716, 10.1213203436), (0.0445663724, 11))
            Line((0.0445663724, 11), (3.0445663724, 11))
            Line((3.0445663724, 11), (3.0445663724, 8))
        make_face()
    extrude(amount=-F4_T15_DEPTH)

    split(bisect_by=Plane(origin=(2.1925209423, -0.5002243025, 0), x_dir=(0, 0, 1), z_dir=(0.9749476162, -0.2224345875, 0)), keep=Keep.TOP)


with BuildPart() as f1_4:
    add(f1_3.part)

    # F4_t12: union F4_tool13
    add(f4_tool13.part)


with BuildPart() as f4_tool18:
    # F4_s19 → F4_t20 (new body)
    with BuildSketch(Plane.XZ.offset(18.850909546)):
        with BuildLine():
            ThreePointArc((3.0445663724, 8), (2.165886716, 10.1213203436), (0.0445663724, 11))
            Line((0.0445663724, 11), (3.0445663724, 11))
            Line((3.0445663724, 11), (3.0445663724, 8))
        make_face()
    extrude(amount=-F4_T20_DEPTH)

    split(bisect_by=Plane(origin=(2.1925209423, -0.5002243025, 0), x_dir=(0, 0, 1), z_dir=(-0.9749476162, 0.2224345875, 0)), keep=Keep.TOP)


with BuildPart() as f1_5:
    add(f1_4.part)

    # F4_t17: union F4_tool18
    add(f4_tool18.part)

    # F0 (on Top) → F5 (join)
    with BuildSketch(Plane.XY):
        with BuildLine():
            Line((-6, 7.0072538219), (-6, 11.414472945))
            ThreePointArc((-6, 11.414472945), (-7.0672827337, 14.6788128793), (-9.8568433896, 16.6821498424))
            ThreePointArc((-9.8568433896, 16.6821498424), (-12.1286787232, 22.0440734554), (-10.825092271, 27.7196459355))
            ThreePointArc((-10.825092271, 27.7196459355), (-9.8130602705, 30.3439953427), (-11.8637687892, 32.269096159))
            ThreePointArc((-11.8637687892, 32.269096159), (-12.0776575065, 35.9154722642), (-10.5480544763, 39.2324168906))
            Line((-10.5480544763, 39.2324168906), (-1.4462802792, 45.9774918854))
            Line((-1.4462802792, 45.9774918854), (0, 46.557336539))
            Line((0, 46.557336539), (1.4462802792, 45.9774918854))
            Line((1.4462802792, 45.9774918854), (10.5480544763, 39.2324168906))
            ThreePointArc((10.5480544763, 39.2324168906), (12.0776575065, 35.9154722642), (11.8637687892, 32.269096159))
            ThreePointArc((11.8637687892, 32.269096159), (9.8130602705, 30.3439953427), (10.825092271, 27.7196459355))
            ThreePointArc((10.825092271, 27.7196459355), (12.1286787232, 22.0440734554), (9.8568433896, 16.6821498424))
            ThreePointArc((9.8568433896, 16.6821498424), (7.0672827337, 14.6788128793), (6, 11.414472945))
            Line((6, 11.414472945), (6, 7.0072538219))
            Line((6, 7.0072538219), (6, 0))
            Line((6, 0), (7.5000002513, 11.414472945))
            ThreePointArc((7.5000002513, 11.414472945), (8.391991284, 13.9415584091), (10.6726818627, 15.3487753182))
            ThreePointArc((10.6726818627, 15.3487753182), (13.6200024271, 21.8800699646), (11.8968068959, 28.8352914154))
            ThreePointArc((11.8968068959, 28.8352914154), (11.3640087027, 30.251868892), (12.8284885302, 30.6337910005))
            ThreePointArc((12.8284885302, 30.6337910005), (13.635549564, 35.6633929404), (11.5888776878, 40.3280877233))
            Line((11.5888776878, 40.3280877233), (2.1839900136, 47.2977917949))
            Line((2.1839900136, 47.2977917949), (0, 48.173400037))
            Line((0, 48.173400037), (-2.1839900136, 47.2977917949))
            Line((-2.1839900136, 47.2977917949), (-11.5888776878, 40.3280877233))
            ThreePointArc((-11.5888776878, 40.3280877233), (-13.635549564, 35.6633929404), (-12.8284885302, 30.6337910005))
            ThreePointArc((-12.8284885302, 30.6337910005), (-11.3640087027, 30.251868892), (-11.8968068959, 28.8352914154))
            ThreePointArc((-11.8968068959, 28.8352914154), (-13.6200024271, 21.8800699646), (-10.6726818627, 15.3487753182))
            ThreePointArc((-10.6726818627, 15.3487753182), (-8.391991284, 13.9415584091), (-7.5000002513, 11.414472945))
            Line((-7.5000002513, 11.414472945), (-6, 0))
            Line((-6, 0), (-6, 7.0072538219))
        make_face()
    extrude(amount=-F5_DEPTH)

    # F6: fillet of radius 5 on 3 edges, made by hand

    # F6_s2 → F6_t1 (cut)
    with BuildSketch(Plane.XZ.offset(-19.5072538219)):
        with BuildLine():
            ThreePointArc((6, 8), (4.5355339059, 11.5355339059), (1, 13))
            Line((1, 13), (6, 13))
            Line((6, 13), (6, 8))
        make_face()
        with BuildLine():
            ThreePointArc((-6, 8), (-4.5355339059, 11.5355339059), (-1, 13))
            Line((-1, 13), (-6, 13))
            Line((-6, 13), (-6, 8))
        make_face()
    extrude(amount=F6_T1_DEPTH, mode=Mode.SUBTRACT)


solid = f1_5.part
